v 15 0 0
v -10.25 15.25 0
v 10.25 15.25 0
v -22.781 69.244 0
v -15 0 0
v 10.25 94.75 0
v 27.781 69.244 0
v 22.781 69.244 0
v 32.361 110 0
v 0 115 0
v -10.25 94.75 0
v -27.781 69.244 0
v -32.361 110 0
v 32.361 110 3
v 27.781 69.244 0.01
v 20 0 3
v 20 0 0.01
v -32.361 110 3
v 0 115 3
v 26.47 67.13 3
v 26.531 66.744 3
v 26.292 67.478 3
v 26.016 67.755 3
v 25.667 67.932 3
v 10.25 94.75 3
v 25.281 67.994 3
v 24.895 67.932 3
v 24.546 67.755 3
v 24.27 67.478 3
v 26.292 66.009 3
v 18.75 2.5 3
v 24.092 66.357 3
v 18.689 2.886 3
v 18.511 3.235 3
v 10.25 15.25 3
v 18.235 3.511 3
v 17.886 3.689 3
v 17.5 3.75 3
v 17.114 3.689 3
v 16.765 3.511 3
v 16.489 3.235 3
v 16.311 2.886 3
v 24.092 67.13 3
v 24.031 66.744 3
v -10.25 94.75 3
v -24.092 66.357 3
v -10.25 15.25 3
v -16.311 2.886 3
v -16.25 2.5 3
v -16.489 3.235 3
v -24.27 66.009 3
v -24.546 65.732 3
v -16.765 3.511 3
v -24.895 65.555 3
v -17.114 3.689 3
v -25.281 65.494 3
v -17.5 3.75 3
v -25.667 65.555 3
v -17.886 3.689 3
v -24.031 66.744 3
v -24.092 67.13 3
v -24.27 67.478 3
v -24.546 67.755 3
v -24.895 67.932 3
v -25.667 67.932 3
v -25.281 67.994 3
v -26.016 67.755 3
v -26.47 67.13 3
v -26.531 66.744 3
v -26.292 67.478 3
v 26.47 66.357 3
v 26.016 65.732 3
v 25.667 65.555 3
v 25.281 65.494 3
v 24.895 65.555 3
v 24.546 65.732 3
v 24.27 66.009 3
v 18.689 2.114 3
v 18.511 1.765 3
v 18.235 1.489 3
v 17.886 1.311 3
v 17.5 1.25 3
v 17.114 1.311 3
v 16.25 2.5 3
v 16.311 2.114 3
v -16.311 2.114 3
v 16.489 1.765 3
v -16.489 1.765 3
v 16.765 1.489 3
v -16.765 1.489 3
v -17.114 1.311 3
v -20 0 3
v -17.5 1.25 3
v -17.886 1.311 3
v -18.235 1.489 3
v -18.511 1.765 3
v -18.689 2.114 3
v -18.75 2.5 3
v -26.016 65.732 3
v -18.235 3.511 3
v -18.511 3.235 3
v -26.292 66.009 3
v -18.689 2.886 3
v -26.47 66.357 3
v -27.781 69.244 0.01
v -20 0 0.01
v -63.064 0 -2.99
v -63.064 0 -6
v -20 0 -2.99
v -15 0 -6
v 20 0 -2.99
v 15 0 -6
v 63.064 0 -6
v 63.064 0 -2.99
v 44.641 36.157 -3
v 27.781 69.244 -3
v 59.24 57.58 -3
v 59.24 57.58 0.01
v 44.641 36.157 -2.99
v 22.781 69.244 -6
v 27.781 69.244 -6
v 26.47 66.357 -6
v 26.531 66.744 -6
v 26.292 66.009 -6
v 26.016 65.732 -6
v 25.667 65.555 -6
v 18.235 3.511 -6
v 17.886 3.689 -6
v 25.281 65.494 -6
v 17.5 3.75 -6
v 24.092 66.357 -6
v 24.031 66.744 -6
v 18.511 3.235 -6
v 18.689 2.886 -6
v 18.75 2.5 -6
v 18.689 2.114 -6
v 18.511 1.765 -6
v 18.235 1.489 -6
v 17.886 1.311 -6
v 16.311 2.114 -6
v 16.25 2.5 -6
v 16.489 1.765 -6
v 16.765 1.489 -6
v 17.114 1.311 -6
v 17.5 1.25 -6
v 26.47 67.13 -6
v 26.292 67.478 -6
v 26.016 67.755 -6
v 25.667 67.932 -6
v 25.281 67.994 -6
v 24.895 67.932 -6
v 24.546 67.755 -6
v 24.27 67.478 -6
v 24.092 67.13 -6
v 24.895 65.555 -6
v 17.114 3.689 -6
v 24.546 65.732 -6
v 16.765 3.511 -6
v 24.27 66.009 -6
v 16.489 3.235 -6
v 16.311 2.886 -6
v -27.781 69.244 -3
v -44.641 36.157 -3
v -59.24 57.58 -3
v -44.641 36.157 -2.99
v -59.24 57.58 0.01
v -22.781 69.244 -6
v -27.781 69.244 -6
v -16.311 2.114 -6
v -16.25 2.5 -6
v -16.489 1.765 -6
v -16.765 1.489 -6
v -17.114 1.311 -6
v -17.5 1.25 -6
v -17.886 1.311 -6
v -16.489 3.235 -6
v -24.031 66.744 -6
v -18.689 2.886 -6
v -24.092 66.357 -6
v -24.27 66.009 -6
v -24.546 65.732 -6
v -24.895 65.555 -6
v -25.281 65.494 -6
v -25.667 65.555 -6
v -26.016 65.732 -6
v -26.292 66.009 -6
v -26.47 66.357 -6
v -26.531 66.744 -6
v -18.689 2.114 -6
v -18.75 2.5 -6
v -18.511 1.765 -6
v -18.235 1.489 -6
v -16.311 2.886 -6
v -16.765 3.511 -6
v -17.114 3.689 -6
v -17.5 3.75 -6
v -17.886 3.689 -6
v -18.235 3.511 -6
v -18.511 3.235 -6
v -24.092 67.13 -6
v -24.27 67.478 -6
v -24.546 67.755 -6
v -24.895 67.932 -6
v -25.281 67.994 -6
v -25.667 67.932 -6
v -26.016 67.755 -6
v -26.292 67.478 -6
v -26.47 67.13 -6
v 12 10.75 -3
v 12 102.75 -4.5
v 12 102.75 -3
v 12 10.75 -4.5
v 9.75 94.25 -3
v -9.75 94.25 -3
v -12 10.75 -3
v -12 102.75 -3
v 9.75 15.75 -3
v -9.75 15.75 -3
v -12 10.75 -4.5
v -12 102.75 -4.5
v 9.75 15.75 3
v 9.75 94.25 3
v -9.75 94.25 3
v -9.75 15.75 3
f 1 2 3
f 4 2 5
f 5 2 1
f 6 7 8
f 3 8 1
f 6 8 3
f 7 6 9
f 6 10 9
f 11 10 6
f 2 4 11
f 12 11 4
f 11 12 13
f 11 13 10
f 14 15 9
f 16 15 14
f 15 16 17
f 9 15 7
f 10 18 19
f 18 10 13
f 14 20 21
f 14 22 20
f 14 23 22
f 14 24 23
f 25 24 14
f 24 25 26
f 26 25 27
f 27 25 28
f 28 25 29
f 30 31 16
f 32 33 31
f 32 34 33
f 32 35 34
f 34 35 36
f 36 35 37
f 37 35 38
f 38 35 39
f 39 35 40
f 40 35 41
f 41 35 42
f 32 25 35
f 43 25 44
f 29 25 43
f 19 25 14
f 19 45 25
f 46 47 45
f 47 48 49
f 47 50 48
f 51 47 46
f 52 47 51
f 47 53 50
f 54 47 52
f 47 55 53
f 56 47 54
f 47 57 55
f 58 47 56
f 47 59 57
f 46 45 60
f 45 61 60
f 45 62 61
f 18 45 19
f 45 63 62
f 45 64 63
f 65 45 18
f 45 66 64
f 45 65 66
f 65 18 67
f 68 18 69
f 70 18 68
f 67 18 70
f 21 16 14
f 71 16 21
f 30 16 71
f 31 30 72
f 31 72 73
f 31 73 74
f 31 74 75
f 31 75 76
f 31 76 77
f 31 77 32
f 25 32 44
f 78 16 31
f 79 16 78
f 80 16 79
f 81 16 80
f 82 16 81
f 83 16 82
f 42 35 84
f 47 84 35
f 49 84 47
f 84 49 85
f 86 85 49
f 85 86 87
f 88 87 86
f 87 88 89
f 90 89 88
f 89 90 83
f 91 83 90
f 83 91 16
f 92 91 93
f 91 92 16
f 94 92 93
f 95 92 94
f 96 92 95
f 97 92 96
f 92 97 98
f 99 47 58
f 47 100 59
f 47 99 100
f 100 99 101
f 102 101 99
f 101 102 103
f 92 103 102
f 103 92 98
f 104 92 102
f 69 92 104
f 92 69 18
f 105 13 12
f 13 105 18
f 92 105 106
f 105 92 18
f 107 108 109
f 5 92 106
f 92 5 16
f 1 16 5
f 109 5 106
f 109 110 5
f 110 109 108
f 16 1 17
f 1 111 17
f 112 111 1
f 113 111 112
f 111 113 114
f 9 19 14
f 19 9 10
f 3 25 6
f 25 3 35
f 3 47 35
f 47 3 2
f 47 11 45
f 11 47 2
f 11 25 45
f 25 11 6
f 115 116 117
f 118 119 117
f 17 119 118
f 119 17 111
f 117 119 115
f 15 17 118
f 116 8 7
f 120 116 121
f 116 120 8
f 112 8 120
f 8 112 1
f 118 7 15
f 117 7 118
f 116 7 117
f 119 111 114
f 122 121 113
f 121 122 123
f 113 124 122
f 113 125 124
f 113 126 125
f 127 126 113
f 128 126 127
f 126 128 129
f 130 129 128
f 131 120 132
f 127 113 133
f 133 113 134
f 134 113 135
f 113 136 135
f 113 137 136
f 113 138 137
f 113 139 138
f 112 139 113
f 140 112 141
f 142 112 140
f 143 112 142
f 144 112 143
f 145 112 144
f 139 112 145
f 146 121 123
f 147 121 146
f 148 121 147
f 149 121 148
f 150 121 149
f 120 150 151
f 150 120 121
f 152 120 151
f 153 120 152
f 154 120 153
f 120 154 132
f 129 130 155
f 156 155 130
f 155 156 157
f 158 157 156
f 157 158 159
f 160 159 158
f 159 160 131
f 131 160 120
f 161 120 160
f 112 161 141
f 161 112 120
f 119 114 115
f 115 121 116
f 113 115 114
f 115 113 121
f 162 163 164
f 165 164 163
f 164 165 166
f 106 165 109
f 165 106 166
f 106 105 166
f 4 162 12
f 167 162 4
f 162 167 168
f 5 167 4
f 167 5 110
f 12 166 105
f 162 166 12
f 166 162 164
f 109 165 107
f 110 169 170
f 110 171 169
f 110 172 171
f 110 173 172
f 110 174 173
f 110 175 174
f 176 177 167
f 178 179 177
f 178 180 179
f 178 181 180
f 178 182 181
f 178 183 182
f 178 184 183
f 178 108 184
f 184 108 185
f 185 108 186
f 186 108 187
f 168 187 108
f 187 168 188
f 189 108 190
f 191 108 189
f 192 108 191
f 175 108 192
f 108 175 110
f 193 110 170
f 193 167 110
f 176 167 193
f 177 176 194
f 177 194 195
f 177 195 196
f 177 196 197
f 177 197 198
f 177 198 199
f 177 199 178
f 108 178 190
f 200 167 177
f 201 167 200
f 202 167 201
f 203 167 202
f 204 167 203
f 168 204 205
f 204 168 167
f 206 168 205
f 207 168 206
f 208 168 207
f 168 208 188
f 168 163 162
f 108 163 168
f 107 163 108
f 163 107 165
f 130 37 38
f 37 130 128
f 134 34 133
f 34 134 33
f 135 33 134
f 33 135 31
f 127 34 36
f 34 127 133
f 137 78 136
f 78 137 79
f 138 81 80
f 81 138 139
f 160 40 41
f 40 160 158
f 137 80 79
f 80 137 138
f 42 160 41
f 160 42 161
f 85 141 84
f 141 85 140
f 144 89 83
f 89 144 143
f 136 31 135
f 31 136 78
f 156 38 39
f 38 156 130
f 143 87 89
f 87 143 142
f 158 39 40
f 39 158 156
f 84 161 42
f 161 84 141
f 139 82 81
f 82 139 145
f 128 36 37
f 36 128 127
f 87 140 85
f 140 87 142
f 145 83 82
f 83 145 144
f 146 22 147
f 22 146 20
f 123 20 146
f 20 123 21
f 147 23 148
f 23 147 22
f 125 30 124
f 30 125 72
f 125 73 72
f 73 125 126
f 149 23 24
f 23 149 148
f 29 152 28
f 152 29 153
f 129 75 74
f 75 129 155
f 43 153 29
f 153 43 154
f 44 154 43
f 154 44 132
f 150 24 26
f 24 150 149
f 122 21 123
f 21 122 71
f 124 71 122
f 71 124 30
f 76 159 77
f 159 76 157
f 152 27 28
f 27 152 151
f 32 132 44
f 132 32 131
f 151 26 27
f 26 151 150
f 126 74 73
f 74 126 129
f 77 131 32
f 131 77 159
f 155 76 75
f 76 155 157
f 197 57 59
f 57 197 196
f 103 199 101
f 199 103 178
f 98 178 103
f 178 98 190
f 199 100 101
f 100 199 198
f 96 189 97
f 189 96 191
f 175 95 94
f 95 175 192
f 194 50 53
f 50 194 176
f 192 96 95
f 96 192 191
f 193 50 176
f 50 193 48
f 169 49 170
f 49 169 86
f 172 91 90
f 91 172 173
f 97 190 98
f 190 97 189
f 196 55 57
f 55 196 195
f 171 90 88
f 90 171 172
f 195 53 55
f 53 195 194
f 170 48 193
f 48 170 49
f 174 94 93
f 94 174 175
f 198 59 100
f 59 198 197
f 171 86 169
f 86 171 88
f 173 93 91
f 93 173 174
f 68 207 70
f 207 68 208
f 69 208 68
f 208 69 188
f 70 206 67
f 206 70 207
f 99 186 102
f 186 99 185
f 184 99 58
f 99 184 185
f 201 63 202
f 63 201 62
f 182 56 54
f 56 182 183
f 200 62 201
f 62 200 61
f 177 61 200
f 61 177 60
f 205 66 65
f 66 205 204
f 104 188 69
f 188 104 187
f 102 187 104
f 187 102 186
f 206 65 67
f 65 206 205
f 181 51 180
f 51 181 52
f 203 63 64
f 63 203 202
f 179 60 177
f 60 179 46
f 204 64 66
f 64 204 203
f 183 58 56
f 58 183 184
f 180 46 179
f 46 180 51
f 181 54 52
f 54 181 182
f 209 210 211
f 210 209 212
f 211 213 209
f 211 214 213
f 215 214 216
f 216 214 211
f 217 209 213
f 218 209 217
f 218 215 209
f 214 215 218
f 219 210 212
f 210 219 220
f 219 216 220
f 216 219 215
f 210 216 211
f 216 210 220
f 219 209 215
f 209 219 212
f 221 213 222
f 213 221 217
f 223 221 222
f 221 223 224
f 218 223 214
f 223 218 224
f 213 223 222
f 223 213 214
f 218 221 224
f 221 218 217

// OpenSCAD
// Renders of laser-cut enclosure for "Falling Water"
// TroGlass Sky Blue 3mm?
// todo
// shallow 'v' on top edge, or '^'?
// etched line along outisde
// vertically position LCD to clamp? leaving space for wire. Support at back to stand?
materialThickness = 3.0;

// the gap the LCD sticks throught

lcdBoardWidth = 24;
lcdBoardHeight = 92;
lcdBoardThickness = 1.5;
lcdDisplayWidth = 19.5;
lcdDisplayHeight = 78.5;
lcdDisplayBottomOffset = 5.0; // bottom of board to bottom of LCD glass layer
lcdDisplayThickness = 6; // ignoring extra bit of backlight at the top

lcdVoidWidth = lcdDisplayWidth + 1.0;
lcdVoidHeight = lcdDisplayHeight + 1.0;


plateOverlap = 5;
golden = 1.61803399;
xplode = 0;
epsilon = 0.01; // merge plates?

plate1Height = 110.0;
plate1WidthBase = 40.0;
plate1WidthTop = golden*plate1WidthBase;//80.0;
plate1Angle = atan2(plate1Height, (plate1WidthTop - plate1WidthBase)/2.0);
plate1Radius = sqrt(plate1Height^2 + (plate1WidthTop-plate1WidthBase)^2);

plate2Angle = 2*plate1Angle/3.0;
plate2Radius = plate1Radius/golden;//3*plate1Radius/4;

plate3Angle = 0.0;
plate3Radius = plate2Radius/golden;//3*plate2Radius/4;

plateHoleDiameter = 2.5;

module LCD()
{
  // lcd, origin is bottom left of glass
  alpha = 1.0;
  translate([-(lcdBoardWidth-lcdDisplayWidth)/2, -lcdDisplayBottomOffset, -(lcdBoardThickness + lcdDisplayThickness/2)])
  {
    color("green", alpha)
      cube([lcdBoardWidth, lcdBoardHeight, lcdBoardThickness]);
    color("aqua", alpha)
      translate([(lcdBoardWidth-lcdDisplayWidth)/2, lcdDisplayBottomOffset,lcdBoardThickness])
        cube([lcdDisplayWidth, lcdDisplayHeight, lcdDisplayThickness]);
  }
}

module holes()
{
  $fn=20;
  translate([plate1WidthBase/2 - plateOverlap/2, plateOverlap/2, -epsilon])
    cylinder(h=4.0*(materialThickness + epsilon)+ epsilon, d=plateHoleDiameter, center=true);
  translate([plate1WidthBase/2 + plateOverlap/2 + plate2Radius*cos(plate1Angle) - plateOverlap, plate2Radius*sin(plate1Angle) - plateOverlap/2, -epsilon])
    cylinder(h=4.0*(materialThickness + epsilon)+ epsilon, d=plateHoleDiameter, center=true);
}

module plate1()
{
  // origin is middle of bottom edge
  lcdVoidPoints = 
  [
    [-lcdVoidWidth/2.0, 0.0],
    [+lcdVoidWidth/2.0, 0.0], 
    [+lcdVoidWidth/2.0, lcdVoidHeight],
    [-lcdVoidWidth/2.0, lcdVoidHeight]
  ];
  plate1Points = 
  [
    [-plate1WidthBase/2.0, 0.0],
    [+plate1WidthBase/2.0, 0.0], 
    [+plate1WidthTop/2.0, plate1Height],
      [0.0, plate1Height + 5],  // paek/valley todo, half the plate2 slope?
    [-plate1WidthTop/2.0, plate1Height]
  ];
  difference()
  {
    linear_extrude(materialThickness)
      polygon(plate1Points);
    translate([0.0, (plate1Height-lcdVoidHeight)/2.0, -epsilon/2])
      linear_extrude(materialThickness + epsilon)
        polygon(lcdVoidPoints);
  }
}

module plate2()
{
  // right hand. origin is bottom corner (excluding overlap), anti-clockwise
  points = 
  [
    [-plateOverlap, 0],
    [0, 0],
    [plate2Radius*cos(plate2Angle), plate2Radius*sin(plate2Angle)],
    [plate2Radius*cos(plate1Angle), plate2Radius*sin(plate1Angle)],   
    [plate2Radius*cos(plate1Angle) - plateOverlap, plate2Radius*sin(plate1Angle)]
  ];
  linear_extrude(materialThickness + epsilon)
    polygon(points);  
}

module plate3()
{
  // right hand. origin is bottom corner (excluding overlap)
  if (true) 
  {
    // extend to top corner of plate2? common hole
    points = 
    [
      [-plateOverlap, 0],
      [plate3Radius*cos(plate3Angle), plate3Radius*sin(plate3Angle)],
        [plate2Radius*cos(plate1Angle), plate2Radius*sin(plate1Angle)],   
        [plate2Radius*cos(plate1Angle) - plateOverlap, plate2Radius*sin(plate1Angle)]
    ];
    linear_extrude(materialThickness + epsilon)
      polygon(points);    
  }
  else
  {
    points = 
    [
      [-plateOverlap, 0],
      [plate3Radius*cos(plate3Angle), plate3Radius*sin(plate3Angle)],
      [plate3Radius*cos(plate2Angle), plate3Radius*sin(plate2Angle)],   
      [plate3Radius*cos(plate2Angle) - plateOverlap, plate3Radius*sin(plate2Angle)],
      [-plateOverlap, plateOverlap]
    ];
    linear_extrude(materialThickness + epsilon)
      polygon(points);    
  }
}

// MAIN
difference()
{
  union()
  {
    color("blue")
    {
      plate1();
      translate([plate1WidthBase/2 + xplode, 0, -materialThickness])
      {
        plate2();
        translate([xplode, 0, -materialThickness])
          plate3();
      }
      mirror([1,0,0])
      {
        translate([plate1WidthBase/2 + xplode, 0, -materialThickness])
        {
          plate2();
          translate([xplode, 0, -materialThickness])
            plate3();
        }
      }
    }
  }
  holes();
  mirror([1,0,0])
    holes();
}
translate([-lcdDisplayWidth/2, (plate1Height-lcdDisplayHeight)/2.0, 0])
  LCD();
